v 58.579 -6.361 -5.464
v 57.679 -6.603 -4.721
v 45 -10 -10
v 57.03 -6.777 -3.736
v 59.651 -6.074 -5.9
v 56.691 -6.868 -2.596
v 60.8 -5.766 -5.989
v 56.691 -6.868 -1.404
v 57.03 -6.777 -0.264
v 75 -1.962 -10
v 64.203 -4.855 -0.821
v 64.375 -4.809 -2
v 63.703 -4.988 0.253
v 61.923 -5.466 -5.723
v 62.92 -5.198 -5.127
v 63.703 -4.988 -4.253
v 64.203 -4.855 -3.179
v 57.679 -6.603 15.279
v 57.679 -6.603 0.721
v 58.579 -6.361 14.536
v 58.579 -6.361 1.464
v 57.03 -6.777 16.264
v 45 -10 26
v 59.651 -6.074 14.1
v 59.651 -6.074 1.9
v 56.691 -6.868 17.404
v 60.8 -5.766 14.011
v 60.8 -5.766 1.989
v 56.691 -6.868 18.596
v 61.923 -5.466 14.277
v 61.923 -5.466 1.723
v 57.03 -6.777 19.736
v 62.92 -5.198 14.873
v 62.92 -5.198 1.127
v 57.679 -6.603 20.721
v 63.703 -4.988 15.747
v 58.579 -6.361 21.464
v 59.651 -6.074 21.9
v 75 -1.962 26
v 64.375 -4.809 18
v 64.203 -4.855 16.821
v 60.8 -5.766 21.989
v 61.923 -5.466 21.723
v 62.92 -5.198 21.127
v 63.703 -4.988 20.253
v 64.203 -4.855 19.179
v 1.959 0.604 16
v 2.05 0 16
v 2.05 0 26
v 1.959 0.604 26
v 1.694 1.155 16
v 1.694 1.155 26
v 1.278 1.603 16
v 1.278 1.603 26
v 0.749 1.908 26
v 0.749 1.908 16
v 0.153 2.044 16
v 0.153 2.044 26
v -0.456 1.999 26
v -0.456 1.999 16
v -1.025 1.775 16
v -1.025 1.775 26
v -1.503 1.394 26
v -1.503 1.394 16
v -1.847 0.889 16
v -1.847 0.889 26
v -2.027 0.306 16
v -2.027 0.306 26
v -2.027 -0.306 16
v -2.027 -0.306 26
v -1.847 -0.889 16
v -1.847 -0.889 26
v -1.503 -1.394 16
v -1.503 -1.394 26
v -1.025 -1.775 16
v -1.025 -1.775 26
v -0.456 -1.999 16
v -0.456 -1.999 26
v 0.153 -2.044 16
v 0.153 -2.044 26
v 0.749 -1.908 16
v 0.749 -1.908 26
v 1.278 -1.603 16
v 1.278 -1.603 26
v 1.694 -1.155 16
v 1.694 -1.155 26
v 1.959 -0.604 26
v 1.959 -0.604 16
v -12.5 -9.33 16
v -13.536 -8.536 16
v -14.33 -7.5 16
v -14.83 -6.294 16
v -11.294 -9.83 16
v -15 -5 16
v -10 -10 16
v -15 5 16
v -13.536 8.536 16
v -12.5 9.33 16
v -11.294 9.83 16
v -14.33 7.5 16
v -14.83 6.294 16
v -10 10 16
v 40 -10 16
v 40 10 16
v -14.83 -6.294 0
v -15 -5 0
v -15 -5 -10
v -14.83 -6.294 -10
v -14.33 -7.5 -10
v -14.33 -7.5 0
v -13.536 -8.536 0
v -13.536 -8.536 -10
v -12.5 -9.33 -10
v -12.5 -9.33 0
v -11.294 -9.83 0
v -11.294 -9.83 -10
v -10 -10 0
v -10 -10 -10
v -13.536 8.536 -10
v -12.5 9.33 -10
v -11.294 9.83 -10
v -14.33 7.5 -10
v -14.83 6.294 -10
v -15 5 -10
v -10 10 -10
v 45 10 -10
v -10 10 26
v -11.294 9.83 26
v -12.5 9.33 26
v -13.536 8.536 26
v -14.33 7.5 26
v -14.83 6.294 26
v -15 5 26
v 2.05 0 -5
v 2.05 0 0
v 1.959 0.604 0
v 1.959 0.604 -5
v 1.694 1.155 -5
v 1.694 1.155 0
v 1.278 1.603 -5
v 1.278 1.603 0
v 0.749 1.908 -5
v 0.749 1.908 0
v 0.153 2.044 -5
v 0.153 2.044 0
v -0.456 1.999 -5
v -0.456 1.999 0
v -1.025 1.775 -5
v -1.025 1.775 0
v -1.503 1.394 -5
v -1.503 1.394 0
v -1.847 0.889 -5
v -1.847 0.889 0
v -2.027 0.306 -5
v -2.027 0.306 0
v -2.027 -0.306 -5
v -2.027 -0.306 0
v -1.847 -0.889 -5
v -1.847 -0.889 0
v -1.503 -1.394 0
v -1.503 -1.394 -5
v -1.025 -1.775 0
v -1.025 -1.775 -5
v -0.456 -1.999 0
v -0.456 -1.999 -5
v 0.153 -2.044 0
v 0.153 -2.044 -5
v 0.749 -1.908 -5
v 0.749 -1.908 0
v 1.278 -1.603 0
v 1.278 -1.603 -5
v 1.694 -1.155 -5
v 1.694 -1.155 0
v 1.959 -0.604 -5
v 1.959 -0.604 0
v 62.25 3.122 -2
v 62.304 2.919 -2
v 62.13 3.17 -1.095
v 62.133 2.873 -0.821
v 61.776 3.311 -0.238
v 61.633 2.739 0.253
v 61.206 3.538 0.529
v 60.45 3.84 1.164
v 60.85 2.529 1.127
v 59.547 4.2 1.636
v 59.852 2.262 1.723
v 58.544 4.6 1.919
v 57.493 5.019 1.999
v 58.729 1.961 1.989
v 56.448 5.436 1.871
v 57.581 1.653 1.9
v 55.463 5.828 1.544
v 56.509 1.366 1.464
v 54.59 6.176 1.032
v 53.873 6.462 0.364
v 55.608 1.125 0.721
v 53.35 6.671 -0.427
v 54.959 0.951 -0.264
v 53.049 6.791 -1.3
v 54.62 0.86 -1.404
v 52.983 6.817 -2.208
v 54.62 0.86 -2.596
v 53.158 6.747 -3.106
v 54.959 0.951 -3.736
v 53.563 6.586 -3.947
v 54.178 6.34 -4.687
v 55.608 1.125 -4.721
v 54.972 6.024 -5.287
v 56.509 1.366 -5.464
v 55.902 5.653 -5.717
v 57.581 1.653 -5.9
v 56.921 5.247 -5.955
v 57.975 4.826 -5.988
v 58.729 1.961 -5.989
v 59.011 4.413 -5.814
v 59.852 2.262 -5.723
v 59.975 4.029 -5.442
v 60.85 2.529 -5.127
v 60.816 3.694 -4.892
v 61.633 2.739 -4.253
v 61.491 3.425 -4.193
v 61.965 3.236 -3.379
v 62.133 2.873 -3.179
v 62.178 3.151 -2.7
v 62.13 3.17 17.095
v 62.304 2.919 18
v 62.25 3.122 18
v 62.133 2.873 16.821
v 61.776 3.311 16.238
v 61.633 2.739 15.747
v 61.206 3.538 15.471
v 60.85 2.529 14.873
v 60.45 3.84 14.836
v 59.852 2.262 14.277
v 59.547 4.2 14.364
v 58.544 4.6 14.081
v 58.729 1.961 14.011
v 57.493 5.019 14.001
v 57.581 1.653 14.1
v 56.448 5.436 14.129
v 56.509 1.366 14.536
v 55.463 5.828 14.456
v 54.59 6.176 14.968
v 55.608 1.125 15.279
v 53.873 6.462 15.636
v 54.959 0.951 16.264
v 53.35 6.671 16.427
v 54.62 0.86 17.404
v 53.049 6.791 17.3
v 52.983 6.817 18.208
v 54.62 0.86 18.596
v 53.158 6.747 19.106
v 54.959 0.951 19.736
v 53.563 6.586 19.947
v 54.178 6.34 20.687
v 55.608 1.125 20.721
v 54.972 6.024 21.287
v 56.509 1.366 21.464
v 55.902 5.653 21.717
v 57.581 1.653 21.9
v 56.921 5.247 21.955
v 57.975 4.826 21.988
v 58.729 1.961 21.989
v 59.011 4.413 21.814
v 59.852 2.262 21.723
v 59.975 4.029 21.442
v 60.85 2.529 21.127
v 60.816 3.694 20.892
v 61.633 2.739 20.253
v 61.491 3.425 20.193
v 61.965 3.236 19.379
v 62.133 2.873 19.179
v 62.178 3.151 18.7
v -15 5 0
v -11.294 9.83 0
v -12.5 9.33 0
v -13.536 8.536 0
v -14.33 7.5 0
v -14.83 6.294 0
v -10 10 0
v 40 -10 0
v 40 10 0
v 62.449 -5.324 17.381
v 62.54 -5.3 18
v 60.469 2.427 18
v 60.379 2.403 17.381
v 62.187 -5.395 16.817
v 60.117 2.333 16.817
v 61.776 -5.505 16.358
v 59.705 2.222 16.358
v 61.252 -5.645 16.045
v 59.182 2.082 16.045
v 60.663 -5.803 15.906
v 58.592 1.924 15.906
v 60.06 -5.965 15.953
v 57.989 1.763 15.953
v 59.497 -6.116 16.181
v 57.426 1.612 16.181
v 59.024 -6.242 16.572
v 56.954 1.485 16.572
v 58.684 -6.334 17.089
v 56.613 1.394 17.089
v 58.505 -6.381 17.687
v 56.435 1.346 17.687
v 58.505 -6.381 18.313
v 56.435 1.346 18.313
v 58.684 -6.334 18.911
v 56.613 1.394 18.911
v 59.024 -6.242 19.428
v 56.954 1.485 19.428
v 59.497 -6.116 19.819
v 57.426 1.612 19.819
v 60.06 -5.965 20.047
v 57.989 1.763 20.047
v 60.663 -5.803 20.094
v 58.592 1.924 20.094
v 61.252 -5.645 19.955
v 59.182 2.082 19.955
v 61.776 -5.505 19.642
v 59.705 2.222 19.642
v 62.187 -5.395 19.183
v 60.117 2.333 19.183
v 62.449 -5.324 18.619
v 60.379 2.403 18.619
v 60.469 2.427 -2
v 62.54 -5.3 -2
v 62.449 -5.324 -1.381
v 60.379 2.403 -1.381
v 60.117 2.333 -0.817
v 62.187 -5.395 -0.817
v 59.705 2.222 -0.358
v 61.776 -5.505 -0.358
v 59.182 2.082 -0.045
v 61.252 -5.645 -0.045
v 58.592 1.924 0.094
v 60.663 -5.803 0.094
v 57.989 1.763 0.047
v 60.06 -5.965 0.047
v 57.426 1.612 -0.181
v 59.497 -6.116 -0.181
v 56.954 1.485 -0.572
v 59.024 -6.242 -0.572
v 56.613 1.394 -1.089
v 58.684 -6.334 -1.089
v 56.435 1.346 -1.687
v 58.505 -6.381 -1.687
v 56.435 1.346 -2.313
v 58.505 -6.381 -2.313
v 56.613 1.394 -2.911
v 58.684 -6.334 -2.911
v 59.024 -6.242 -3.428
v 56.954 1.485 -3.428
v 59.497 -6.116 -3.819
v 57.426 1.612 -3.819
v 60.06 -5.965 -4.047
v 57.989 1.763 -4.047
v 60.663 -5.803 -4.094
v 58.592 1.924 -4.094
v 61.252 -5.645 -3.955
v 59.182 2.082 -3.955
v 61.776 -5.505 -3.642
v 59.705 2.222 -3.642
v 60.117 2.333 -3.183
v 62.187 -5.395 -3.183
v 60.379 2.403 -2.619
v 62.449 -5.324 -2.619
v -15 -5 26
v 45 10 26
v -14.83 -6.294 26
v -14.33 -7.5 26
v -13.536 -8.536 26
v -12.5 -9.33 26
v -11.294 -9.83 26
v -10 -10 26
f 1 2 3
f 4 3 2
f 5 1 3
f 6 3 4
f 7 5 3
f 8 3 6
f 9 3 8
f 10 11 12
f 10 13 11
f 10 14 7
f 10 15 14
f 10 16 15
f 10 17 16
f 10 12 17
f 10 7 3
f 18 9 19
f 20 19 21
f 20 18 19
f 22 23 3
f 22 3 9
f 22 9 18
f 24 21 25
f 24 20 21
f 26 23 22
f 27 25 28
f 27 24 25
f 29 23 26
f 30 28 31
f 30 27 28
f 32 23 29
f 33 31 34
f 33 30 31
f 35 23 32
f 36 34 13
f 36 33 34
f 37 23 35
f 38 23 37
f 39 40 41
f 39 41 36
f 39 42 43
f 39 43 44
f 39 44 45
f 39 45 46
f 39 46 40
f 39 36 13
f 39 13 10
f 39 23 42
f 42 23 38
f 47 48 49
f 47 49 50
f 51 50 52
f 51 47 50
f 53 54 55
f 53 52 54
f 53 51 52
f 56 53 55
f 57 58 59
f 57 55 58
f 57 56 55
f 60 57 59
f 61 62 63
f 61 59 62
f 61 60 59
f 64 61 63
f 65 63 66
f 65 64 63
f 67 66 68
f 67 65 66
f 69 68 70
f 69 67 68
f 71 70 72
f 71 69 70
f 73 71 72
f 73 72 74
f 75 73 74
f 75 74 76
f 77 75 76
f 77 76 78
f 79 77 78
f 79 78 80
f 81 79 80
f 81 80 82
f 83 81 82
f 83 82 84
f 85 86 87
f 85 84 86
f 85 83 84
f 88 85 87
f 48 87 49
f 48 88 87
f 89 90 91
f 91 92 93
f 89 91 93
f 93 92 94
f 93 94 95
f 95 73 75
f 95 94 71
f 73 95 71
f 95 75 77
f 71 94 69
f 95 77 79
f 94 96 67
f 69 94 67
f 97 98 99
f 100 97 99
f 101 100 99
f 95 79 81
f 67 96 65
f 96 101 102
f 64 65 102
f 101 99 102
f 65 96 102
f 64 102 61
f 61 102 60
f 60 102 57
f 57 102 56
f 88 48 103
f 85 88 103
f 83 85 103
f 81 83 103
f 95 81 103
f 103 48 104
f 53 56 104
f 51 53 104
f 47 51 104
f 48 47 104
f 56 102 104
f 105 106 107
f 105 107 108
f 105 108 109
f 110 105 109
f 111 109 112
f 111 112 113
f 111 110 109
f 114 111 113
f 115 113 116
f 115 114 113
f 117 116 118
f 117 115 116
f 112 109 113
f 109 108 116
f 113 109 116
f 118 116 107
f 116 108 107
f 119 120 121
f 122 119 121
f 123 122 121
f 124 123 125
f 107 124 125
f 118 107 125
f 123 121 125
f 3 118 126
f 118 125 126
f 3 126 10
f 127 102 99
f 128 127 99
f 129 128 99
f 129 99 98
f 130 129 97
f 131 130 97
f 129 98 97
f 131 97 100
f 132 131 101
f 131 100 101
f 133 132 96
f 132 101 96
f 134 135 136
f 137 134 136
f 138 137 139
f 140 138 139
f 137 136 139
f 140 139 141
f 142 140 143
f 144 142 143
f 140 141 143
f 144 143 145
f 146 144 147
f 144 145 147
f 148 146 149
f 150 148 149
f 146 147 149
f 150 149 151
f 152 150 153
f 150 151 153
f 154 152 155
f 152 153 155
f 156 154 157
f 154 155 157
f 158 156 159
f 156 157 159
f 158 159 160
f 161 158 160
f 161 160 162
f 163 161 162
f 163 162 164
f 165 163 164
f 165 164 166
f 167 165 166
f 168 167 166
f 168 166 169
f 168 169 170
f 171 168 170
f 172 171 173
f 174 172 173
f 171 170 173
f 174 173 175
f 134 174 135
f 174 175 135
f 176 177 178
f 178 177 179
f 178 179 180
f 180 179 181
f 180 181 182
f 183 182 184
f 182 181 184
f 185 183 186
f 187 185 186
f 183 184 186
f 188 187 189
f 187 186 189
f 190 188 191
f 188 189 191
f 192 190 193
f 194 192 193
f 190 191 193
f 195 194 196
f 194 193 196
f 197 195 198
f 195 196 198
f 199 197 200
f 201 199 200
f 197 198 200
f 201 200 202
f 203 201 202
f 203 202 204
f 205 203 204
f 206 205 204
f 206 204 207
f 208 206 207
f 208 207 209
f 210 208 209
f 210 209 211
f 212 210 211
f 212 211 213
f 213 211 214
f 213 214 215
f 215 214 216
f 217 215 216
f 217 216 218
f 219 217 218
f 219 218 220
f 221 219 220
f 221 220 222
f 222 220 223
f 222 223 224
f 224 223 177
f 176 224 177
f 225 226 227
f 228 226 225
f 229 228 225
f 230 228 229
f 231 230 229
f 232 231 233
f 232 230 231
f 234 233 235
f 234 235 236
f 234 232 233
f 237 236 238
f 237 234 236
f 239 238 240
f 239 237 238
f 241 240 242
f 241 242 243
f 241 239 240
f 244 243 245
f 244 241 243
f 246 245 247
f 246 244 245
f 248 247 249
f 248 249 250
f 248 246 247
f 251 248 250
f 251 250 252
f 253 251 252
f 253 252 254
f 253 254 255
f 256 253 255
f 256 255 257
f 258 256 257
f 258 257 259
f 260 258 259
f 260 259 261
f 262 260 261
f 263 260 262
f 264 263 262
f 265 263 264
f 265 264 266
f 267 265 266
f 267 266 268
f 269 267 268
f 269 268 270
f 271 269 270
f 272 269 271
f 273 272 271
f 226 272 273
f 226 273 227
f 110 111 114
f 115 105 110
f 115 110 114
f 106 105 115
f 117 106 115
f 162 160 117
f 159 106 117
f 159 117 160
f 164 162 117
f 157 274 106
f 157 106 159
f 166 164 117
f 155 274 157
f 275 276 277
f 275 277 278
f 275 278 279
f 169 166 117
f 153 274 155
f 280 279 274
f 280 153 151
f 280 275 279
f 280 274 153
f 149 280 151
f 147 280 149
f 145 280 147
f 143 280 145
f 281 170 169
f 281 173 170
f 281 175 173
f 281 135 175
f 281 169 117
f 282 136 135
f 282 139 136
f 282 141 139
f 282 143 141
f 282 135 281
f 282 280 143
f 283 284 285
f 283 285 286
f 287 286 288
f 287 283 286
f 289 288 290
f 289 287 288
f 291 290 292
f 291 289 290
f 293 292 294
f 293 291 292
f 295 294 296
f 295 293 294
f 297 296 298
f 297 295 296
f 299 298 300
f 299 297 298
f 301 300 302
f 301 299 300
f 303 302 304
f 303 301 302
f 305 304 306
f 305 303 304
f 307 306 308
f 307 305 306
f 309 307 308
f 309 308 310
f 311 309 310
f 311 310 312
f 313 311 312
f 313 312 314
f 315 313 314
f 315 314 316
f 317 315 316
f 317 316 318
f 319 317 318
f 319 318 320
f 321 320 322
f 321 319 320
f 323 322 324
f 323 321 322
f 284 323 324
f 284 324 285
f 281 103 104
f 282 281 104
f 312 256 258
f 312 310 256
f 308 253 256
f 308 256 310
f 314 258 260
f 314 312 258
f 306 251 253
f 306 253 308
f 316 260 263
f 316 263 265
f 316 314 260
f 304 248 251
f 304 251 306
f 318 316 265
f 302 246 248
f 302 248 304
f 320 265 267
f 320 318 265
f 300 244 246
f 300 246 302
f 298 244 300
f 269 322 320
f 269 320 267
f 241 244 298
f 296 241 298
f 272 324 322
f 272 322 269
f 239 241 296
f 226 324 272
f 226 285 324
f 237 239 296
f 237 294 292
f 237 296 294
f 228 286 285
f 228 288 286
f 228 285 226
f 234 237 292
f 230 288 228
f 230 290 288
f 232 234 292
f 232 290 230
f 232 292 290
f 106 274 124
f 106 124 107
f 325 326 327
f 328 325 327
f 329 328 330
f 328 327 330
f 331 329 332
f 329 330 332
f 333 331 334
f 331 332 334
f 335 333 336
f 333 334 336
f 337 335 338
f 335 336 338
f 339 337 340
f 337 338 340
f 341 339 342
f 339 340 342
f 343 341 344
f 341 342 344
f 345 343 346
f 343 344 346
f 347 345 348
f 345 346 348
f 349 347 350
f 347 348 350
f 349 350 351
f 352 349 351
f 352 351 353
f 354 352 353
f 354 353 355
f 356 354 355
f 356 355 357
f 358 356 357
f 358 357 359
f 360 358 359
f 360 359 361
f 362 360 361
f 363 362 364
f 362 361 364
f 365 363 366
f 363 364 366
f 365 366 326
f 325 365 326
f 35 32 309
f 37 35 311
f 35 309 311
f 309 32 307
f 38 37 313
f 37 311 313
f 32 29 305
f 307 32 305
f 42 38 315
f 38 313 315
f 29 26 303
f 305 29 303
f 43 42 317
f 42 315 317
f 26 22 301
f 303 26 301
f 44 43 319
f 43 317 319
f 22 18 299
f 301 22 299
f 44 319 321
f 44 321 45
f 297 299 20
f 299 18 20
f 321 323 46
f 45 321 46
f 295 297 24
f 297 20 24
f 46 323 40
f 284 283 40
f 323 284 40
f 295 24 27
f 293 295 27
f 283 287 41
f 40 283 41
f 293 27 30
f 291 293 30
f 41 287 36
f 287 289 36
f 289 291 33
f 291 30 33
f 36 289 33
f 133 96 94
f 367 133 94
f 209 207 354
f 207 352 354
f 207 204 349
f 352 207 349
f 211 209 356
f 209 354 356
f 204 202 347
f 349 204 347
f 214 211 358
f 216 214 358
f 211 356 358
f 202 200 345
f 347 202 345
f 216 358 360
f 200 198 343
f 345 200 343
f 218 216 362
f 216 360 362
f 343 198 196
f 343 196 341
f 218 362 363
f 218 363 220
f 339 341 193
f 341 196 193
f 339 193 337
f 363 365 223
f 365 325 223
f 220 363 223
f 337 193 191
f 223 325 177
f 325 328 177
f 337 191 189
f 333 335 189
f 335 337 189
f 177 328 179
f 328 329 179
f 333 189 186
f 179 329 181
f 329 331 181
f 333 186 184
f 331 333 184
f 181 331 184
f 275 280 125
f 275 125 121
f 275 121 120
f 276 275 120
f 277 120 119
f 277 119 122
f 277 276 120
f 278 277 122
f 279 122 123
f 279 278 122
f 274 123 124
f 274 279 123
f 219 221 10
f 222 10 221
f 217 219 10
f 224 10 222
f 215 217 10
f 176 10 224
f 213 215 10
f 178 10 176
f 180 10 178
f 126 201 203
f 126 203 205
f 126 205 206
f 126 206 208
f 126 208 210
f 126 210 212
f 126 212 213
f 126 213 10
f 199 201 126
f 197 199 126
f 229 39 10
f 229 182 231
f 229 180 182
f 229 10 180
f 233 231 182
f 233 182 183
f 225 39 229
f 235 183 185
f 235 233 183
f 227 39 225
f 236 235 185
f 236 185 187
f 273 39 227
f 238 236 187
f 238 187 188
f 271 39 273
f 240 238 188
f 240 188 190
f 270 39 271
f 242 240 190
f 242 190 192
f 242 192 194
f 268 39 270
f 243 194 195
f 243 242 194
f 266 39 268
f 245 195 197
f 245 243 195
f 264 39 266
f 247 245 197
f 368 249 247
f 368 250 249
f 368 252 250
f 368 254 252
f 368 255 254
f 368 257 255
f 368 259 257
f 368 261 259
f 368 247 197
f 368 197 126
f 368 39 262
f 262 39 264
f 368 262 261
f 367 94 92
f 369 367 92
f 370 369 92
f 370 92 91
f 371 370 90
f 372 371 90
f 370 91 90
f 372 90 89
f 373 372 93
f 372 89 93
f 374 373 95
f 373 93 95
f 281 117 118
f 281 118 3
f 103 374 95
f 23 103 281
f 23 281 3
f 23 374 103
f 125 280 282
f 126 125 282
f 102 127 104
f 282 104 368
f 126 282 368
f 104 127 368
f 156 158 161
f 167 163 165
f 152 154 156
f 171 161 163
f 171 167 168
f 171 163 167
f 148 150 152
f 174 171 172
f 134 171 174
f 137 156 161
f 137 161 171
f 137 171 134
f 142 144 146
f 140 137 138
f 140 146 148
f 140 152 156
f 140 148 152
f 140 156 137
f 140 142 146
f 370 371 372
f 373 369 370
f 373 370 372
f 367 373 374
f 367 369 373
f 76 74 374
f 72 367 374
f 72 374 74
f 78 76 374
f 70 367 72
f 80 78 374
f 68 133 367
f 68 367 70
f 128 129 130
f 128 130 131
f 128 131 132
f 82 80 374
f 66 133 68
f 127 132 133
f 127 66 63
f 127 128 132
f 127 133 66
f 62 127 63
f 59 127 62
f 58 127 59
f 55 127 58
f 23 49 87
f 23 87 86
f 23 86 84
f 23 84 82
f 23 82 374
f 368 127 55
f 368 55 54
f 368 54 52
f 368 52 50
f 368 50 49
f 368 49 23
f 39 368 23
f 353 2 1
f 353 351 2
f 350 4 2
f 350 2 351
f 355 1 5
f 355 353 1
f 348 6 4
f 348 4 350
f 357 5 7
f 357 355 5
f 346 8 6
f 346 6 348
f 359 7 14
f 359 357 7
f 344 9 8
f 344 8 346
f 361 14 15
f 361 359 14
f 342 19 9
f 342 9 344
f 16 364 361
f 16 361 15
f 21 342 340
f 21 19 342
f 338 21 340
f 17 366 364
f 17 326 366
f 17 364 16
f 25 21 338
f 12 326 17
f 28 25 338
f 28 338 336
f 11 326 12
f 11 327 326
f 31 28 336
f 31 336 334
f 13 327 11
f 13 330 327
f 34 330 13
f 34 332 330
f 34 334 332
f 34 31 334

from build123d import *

# Parameters (mm, degrees)
SKETCH4_R               = 2.05
SKETCH4_W               = 5
SKETCH4_H               = 20
BOSS_LARGEUR_DEPTH      = 10
SKETCH4_4_W             = 5
SKETCH4_4_H             = 20
BOSS_EXTRUDE4_DEPTH     = 8
CUT_VIS_REACH           = 36.848
SKETCH5_R               = 2.1
SKETCH5_R_2             = 4
SKETCH5_4_R             = 4
SKETCH5_4_R_2           = 2.1
BOSS_VIS_DEPTH          = 8
SKETCH4_6_R             = 2.05
CUT_EXTRUDE7_DEPTH      = 27
CUT_EXTRUDE7_DEPTH_BACK = 5


with BuildPart() as part:
    # Sketch4 → Boss-Largeur (new body)
    with BuildSketch(Plane.XY):
        with BuildLine():
            Line((40, 10), (-10, 10))
            ThreePointArc((-10, 10), (-13.535533906, 8.535533906), (-15, 5))
            Line((-15, 5), (-15, -5))
            ThreePointArc((-15, -5), (-13.535533906, -8.535533906), (-10, -10))
            Line((-10, -10), (40, -10))
            Line((40, -10), (40, 10))
        make_face()
        Circle(SKETCH4_R, mode=Mode.SUBTRACT)
        with Locations((42.5, 0)):
            Rectangle(SKETCH4_W, SKETCH4_H)
        Polygon((75, -1.961524227), (45, 10), (45, -10), align=None)
        Circle(SKETCH4_R)
    extrude(amount=-BOSS_LARGEUR_DEPTH)

    # Sketch4<4> → Boss-Extrude4 (add)
    with BuildSketch(Plane.XY):
        with Locations((42.5, 0)):
            Rectangle(SKETCH4_4_W, SKETCH4_4_H)
        Polygon((45, -10), (75, -1.961524227), (45, 10), align=None)
    extrude(amount=BOSS_EXTRUDE4_DEPTH)

    # Sketch5 → Cut-Vis (cut, up to next)
    with BuildSketch(Plane(origin=(5.514428415, -20.580127019, 0), x_dir=(0.965925826, 0.258819045, 0), z_dir=(0.258819045, -0.965925826, 0)), mode=Mode.PRIVATE) as cut_vis_sk1:
        with Locations((56.936757144, -2)):
            Circle(SKETCH5_R)
    cut_vis_tool1 = extrude(cut_vis_sk1.sketch, amount=-CUT_VIS_REACH, mode=Mode.PRIVATE) & part.part
    add(cut_vis_tool1.solids().sort_by_distance((60.511113, -5.84381, -2))[0], mode=Mode.SUBTRACT)
    # Sketch5 → Cut-Vis (cut, up to next)
    with BuildSketch(Plane(origin=(5.514428415, -20.580127019, 0), x_dir=(0.965925826, 0.258819045, 0), z_dir=(0.258819045, -0.965925826, 0)), mode=Mode.PRIVATE) as cut_vis_sk2:
        with Locations((56.936757144, -2)):
            Circle(SKETCH5_R_2)
        with Locations((56.936757144, -2)):
            Circle(SKETCH5_R, mode=Mode.SUBTRACT)
    cut_vis_tool2 = extrude(cut_vis_sk2.sketch, amount=-CUT_VIS_REACH, mode=Mode.PRIVATE) & part.part
    add(cut_vis_tool2.solids().sort_by_distance((56.756691, -6.849804, -2))[0], mode=Mode.SUBTRACT)

    # Sketch5<4> → Boss-Vis (add)
    with BuildSketch(Plane(origin=(5.514428415, -20.580127019, 0), x_dir=(0.965925826, 0.258819045, 0), z_dir=(0.258819045, -0.965925826, 0))):
        with Locations((56.936757144, -2)):
            Circle(SKETCH5_4_R)
        with Locations((56.936757144, -2)):
            Circle(SKETCH5_4_R_2, mode=Mode.SUBTRACT)
    extrude(amount=-BOSS_VIS_DEPTH)

    # Mirror4: part across plane


with BuildPart() as part_1:
    add(part.part)
    add(part.part.mirror(Plane.XY.offset(8)))

    # Sketch4<6> → Cut-Extrude7 (cut, two sides)
    with BuildSketch(Plane.XY) as cut_extrude7_sk:
        Circle(SKETCH4_6_R)
    extrude(amount=CUT_EXTRUDE7_DEPTH, mode=Mode.SUBTRACT)
    extrude(cut_extrude7_sk.sketch, amount=-CUT_EXTRUDE7_DEPTH_BACK, mode=Mode.SUBTRACT)


solid = part_1.part
